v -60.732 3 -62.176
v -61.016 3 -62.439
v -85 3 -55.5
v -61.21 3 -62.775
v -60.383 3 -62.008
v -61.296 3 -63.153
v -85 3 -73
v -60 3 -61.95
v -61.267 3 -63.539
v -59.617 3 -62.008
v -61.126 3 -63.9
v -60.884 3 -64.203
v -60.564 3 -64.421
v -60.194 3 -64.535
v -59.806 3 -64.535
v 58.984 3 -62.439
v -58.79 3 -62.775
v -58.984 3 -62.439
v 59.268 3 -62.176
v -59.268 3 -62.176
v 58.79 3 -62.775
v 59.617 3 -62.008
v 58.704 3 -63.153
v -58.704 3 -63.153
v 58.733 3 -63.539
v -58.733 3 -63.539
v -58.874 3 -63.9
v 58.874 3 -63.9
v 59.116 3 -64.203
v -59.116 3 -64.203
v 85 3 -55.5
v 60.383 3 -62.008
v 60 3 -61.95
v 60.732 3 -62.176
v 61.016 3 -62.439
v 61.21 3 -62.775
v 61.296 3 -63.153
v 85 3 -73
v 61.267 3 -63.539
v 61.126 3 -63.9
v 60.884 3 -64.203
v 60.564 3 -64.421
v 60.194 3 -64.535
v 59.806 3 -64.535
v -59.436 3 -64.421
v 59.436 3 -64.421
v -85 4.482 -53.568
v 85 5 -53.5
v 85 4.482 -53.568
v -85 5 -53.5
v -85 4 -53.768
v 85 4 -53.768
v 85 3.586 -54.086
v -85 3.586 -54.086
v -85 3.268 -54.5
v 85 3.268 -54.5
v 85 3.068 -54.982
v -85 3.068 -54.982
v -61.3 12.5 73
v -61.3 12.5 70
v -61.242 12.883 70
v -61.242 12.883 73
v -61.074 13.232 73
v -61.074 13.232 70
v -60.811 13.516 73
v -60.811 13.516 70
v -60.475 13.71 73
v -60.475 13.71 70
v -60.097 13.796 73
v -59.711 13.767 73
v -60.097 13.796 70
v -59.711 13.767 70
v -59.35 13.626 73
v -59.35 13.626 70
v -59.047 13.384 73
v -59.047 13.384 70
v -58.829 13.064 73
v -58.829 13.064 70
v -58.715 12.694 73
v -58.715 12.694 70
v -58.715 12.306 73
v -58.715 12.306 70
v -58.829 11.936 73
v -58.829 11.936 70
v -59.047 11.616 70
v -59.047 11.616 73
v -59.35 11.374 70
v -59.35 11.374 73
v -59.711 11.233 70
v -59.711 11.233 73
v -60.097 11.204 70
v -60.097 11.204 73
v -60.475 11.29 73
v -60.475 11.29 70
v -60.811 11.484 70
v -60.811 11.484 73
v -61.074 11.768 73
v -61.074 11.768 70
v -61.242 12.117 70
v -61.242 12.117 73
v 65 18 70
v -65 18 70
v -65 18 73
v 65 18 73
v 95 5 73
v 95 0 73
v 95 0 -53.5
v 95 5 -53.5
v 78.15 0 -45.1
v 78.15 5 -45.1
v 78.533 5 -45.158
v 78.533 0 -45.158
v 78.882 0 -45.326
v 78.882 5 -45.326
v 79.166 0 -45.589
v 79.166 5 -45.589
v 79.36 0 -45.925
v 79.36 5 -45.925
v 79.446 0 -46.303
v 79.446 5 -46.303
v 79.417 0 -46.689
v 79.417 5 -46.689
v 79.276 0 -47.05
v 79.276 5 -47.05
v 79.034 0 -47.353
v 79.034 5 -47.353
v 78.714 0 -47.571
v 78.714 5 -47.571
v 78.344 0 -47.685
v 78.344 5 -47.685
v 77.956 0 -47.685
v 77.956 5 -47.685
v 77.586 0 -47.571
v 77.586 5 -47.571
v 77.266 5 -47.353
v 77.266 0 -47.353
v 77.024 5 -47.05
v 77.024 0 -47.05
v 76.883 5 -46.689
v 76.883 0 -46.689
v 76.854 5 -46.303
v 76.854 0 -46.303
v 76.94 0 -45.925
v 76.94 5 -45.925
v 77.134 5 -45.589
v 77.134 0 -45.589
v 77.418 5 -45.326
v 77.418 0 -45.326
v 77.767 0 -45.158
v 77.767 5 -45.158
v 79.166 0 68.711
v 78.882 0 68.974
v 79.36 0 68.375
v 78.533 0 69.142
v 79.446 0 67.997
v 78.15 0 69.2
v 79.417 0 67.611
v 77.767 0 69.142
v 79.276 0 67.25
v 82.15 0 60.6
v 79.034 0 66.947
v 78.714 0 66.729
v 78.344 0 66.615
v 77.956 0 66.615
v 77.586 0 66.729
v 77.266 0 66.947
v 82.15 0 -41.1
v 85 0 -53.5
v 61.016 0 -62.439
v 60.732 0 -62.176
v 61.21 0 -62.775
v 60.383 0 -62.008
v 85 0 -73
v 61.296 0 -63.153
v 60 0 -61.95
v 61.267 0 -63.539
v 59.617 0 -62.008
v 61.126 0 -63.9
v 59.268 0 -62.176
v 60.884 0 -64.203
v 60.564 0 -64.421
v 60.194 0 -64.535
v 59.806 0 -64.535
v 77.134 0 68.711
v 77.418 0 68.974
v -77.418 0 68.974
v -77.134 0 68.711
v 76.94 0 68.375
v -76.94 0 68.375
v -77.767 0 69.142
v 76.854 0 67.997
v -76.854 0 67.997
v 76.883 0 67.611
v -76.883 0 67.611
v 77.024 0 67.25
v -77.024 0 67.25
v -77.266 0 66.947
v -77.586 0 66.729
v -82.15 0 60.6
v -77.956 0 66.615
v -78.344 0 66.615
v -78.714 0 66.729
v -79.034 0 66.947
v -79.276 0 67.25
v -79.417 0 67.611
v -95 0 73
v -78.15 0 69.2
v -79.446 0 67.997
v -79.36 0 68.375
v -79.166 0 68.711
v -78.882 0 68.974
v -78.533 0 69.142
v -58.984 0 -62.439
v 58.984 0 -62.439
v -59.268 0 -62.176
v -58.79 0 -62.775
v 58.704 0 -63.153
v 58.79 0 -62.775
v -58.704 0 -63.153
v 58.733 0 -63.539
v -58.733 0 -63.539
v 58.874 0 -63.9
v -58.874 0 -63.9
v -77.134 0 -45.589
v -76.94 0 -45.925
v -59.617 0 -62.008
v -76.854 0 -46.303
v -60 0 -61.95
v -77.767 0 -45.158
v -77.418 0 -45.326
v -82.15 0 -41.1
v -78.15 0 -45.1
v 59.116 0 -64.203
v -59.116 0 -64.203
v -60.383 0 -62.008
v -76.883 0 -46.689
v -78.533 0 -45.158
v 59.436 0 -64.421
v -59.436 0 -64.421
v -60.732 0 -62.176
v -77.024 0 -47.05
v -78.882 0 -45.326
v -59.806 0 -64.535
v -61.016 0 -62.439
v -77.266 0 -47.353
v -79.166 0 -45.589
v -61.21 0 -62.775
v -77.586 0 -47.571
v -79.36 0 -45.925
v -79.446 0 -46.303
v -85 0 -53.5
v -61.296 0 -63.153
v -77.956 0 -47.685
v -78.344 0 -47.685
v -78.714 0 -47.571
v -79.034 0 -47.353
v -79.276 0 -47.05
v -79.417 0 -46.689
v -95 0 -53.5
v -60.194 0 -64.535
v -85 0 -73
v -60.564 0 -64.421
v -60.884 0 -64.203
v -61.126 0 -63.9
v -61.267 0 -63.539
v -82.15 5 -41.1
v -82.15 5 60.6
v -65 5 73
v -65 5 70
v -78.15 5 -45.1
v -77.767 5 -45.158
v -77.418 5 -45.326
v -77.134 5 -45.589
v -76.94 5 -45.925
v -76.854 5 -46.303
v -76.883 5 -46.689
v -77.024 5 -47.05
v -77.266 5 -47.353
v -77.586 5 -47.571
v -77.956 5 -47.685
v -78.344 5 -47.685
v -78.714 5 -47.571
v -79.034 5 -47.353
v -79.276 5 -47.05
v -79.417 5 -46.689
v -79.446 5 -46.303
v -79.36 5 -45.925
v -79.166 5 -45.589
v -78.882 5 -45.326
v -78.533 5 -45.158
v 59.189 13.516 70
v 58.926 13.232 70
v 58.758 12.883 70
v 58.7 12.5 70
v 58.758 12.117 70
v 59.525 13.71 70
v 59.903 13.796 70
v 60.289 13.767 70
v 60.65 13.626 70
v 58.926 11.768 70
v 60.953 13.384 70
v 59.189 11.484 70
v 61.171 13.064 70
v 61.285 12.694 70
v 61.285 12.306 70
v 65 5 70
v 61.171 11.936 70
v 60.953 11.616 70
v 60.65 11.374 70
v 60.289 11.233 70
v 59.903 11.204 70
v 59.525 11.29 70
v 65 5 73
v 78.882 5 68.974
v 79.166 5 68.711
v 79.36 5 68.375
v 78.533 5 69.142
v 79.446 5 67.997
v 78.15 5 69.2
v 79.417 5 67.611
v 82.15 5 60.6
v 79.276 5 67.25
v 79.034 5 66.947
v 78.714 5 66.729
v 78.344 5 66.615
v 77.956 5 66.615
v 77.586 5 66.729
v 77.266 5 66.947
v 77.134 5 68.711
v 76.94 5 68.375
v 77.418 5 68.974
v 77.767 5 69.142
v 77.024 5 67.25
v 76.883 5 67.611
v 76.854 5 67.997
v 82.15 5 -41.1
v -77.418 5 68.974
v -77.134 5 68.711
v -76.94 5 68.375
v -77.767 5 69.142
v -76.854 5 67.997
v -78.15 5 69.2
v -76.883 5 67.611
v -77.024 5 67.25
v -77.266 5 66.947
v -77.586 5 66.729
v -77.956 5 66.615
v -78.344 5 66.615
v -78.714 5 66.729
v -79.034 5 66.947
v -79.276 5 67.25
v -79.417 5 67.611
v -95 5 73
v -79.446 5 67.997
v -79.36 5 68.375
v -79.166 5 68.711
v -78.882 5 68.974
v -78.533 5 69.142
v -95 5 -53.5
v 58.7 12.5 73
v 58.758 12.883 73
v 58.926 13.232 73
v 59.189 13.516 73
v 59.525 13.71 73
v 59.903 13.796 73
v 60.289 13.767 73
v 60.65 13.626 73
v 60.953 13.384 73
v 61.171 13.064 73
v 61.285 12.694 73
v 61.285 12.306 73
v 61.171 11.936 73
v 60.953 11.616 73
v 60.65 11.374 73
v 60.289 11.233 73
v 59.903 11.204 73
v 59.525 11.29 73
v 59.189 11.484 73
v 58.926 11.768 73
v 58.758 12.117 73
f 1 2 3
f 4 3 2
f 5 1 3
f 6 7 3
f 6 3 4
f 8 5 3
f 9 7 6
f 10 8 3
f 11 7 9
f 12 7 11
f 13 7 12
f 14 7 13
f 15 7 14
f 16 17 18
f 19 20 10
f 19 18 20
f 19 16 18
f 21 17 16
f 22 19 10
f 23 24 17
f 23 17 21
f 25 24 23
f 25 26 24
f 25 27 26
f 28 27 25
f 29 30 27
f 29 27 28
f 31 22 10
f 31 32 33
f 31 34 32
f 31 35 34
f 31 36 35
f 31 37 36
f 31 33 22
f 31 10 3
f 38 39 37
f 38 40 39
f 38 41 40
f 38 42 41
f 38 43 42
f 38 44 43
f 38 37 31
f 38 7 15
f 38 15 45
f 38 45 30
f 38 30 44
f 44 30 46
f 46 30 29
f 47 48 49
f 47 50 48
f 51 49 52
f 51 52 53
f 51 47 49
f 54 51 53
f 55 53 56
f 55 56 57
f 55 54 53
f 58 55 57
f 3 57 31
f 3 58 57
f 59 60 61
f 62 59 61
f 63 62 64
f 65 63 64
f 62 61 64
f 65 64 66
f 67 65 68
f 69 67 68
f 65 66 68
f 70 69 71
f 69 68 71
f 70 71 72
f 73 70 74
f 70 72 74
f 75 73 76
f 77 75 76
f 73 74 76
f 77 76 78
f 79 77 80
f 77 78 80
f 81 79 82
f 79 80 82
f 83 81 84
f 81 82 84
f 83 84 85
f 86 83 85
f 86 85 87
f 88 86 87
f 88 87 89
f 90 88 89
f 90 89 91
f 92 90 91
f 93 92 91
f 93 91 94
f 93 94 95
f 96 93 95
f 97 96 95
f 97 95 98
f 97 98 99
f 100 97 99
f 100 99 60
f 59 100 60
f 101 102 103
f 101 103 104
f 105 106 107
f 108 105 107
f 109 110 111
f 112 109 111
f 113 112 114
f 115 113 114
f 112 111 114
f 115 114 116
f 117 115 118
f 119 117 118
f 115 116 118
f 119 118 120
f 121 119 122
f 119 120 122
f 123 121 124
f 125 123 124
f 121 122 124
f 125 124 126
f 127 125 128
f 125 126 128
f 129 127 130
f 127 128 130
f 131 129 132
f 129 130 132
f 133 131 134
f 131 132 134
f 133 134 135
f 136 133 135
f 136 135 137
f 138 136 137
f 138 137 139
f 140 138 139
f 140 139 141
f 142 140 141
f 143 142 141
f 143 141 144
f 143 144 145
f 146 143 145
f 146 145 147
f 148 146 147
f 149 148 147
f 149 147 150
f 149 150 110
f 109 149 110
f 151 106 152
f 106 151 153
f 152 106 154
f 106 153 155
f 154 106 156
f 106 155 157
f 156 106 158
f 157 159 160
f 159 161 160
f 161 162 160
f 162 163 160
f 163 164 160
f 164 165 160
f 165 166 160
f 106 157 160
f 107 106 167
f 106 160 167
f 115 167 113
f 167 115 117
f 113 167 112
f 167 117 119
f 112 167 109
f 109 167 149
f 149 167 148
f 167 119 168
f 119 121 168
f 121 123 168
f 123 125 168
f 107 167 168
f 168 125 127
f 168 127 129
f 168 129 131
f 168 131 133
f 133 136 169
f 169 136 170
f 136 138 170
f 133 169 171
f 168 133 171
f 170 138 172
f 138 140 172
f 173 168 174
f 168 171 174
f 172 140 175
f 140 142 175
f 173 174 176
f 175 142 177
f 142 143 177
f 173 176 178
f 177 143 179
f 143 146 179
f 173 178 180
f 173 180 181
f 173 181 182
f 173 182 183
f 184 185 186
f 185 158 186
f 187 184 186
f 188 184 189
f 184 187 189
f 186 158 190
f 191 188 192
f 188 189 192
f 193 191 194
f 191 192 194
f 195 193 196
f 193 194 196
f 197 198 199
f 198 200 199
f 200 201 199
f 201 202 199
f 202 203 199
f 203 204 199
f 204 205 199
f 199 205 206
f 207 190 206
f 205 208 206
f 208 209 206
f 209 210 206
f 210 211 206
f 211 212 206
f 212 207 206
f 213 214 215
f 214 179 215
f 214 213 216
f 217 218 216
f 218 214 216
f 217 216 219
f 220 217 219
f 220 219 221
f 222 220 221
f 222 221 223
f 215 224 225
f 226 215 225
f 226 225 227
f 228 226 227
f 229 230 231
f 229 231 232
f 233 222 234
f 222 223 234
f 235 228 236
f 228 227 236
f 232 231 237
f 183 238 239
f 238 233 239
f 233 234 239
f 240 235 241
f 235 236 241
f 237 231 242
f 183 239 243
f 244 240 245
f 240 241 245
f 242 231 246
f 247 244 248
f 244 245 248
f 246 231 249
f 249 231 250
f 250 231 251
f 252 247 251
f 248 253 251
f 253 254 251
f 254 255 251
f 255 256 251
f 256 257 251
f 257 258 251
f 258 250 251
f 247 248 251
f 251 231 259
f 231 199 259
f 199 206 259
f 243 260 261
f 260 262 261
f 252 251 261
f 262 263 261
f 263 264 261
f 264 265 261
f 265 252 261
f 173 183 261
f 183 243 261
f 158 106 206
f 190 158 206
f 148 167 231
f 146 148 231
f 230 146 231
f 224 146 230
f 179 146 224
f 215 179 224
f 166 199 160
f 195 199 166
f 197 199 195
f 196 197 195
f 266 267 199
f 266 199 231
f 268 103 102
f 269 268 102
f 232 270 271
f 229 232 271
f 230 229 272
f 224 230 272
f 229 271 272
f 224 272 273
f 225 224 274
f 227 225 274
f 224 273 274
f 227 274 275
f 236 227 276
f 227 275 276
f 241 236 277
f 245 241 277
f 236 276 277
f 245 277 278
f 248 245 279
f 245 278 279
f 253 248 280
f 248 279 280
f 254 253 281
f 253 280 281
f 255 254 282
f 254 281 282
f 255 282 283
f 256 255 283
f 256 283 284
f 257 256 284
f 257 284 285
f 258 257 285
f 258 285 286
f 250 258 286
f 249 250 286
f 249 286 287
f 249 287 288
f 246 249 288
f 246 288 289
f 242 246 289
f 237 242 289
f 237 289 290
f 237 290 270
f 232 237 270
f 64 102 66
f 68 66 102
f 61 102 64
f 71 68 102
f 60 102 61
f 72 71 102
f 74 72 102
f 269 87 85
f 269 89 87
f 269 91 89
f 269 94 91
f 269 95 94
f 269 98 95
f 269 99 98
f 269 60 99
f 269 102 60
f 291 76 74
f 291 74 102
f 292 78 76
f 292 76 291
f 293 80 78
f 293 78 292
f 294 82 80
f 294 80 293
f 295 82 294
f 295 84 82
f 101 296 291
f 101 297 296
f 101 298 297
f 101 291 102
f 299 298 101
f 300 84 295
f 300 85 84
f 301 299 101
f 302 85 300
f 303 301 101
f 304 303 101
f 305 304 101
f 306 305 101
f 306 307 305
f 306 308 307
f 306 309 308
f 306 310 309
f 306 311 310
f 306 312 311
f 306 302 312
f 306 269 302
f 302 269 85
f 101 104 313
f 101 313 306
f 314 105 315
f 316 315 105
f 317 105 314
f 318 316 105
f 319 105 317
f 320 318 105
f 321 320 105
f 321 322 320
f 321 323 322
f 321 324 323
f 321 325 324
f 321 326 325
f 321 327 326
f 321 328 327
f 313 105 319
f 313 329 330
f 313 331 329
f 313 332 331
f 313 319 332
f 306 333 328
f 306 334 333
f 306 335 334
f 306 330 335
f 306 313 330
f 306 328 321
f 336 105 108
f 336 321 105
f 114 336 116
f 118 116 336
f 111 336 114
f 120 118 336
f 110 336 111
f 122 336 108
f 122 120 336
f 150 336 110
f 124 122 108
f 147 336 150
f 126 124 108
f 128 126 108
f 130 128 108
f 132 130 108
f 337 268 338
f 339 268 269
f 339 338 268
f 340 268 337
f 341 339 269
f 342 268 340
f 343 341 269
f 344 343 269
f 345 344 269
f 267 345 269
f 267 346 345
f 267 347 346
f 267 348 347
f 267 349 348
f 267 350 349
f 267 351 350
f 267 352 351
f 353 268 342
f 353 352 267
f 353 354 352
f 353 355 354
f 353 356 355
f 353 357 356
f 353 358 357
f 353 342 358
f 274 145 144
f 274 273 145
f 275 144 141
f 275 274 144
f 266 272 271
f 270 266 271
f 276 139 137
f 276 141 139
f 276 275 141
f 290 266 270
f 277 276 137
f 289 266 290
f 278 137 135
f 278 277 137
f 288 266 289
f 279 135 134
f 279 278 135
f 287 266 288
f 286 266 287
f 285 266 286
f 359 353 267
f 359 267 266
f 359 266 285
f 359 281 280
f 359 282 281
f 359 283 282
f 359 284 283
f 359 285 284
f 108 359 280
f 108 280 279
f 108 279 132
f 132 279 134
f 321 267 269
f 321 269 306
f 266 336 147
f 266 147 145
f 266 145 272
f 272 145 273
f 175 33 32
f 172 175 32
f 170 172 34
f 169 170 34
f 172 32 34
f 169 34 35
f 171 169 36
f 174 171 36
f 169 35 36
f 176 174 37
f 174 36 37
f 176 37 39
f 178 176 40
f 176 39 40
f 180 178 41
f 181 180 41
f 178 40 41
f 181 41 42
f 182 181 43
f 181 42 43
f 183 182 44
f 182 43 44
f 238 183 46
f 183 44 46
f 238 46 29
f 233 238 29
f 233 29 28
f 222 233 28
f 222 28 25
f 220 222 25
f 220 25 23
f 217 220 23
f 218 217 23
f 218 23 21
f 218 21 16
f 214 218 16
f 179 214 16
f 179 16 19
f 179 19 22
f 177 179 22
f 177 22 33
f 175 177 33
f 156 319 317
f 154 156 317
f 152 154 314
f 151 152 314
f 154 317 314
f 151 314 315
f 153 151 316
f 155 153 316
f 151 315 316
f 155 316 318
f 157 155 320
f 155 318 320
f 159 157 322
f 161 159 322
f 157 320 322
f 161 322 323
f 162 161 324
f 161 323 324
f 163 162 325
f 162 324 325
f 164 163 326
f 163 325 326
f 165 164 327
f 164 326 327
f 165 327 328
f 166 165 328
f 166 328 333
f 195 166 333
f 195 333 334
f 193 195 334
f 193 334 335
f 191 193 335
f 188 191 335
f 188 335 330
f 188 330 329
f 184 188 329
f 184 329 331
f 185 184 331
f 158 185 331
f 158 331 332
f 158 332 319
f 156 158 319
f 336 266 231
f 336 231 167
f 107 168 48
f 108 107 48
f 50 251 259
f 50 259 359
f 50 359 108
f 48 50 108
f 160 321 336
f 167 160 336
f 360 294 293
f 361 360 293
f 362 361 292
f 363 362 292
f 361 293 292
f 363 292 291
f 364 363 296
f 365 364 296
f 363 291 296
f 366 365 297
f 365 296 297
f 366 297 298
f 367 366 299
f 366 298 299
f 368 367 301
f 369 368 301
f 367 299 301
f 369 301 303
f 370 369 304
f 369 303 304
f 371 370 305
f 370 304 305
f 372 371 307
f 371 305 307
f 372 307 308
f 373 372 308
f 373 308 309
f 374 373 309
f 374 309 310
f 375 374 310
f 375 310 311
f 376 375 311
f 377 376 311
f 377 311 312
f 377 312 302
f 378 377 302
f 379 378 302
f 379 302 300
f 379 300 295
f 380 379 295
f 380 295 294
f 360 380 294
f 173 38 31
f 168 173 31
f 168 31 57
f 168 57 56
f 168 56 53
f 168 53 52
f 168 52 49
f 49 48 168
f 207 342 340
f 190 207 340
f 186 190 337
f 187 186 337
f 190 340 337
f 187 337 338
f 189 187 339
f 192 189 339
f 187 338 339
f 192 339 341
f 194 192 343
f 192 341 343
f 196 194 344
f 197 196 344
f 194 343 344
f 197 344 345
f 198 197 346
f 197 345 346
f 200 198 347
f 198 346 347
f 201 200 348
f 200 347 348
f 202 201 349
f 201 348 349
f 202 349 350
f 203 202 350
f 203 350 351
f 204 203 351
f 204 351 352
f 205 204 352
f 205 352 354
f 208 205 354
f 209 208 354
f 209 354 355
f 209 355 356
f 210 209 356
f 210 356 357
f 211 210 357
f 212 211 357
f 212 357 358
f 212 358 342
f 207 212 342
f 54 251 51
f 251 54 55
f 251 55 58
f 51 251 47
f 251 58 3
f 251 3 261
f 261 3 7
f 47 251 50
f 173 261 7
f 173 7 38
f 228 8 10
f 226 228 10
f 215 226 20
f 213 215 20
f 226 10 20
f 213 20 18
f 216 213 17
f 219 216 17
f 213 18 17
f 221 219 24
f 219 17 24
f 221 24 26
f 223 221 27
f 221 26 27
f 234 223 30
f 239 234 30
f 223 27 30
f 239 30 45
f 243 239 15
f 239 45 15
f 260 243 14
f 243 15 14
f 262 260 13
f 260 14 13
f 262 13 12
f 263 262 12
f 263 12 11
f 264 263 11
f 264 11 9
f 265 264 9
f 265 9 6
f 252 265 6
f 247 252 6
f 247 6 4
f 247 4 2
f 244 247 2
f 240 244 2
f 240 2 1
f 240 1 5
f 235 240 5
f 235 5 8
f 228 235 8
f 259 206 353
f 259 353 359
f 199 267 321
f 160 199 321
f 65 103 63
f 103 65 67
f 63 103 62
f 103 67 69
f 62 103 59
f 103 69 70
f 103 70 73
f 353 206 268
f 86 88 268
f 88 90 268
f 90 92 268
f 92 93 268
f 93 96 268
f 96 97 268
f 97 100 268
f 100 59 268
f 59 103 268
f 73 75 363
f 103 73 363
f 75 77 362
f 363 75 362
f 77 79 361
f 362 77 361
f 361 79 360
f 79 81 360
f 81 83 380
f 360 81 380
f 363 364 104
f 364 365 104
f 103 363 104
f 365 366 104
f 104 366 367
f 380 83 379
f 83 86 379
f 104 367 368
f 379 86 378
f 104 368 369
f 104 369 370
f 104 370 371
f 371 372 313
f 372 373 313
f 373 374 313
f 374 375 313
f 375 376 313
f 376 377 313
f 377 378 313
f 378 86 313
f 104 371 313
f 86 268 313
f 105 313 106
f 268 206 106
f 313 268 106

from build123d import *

# Parameters (mm, degrees)
SKETCH1_W           = 170
SKETCH1_H           = 146
BOSS_EXTRUDE1_DEPTH = 3
SKETCH2_R           = 1.3
CUT_EXTRUDE1_DEPTH  = 3
CUT_EXTRUDE2_DEPTH  = 3
BOSS_EXTRUDE2_START = 2
SKETCH4_R           = 1.3
SKETCH4_W           = 164.3
SKETCH4_H           = 101.7
BOSS_EXTRUDE2_DEPTH = 2
BOSS_EXTRUDE5_DEPTH = 10
SKETCH10_W          = 126.5
SKETCH10_H          = 5
BOSS_EXTRUDE6_DEPTH = 10
SKETCH12_W          = 190
SKETCH12_H          = 3
BOSS_EXTRUDE8_DEPTH = 13
SKETCH13_R          = 1.3
CUT_EXTRUDE3_DEPTH  = 13
FILLET4_R           = 2
SKETCH14_R          = 1.3
CUT_EXTRUDE4_DEPTH  = 13
SKETCH15_W          = 30
SKETCH15_H          = 3
CUT_EXTRUDE5_DEPTH  = 13


with BuildPart() as part:
    # Sketch1 → Boss-Extrude1 (new body)
    with BuildSketch(Plane(origin=(0, 0, 0), x_dir=(1, 0, 0), z_dir=(0, 1, 0))):
        Rectangle(SKETCH1_W, SKETCH1_H)
    extrude(amount=BOSS_EXTRUDE1_DEPTH)

    # Sketch2 → Cut-Extrude1 (cut)
    with BuildSketch(Plane(origin=(0, 3, 0), x_dir=(1, 0, 0), z_dir=(0, 1, 0))):
        with Locations(Location((78.15, -67.9, 0), (0, 0, 270))):
            Circle(SKETCH2_R)
        with Locations(Location((-78.15, 46.4, 0), (0, 0, 270))):
            Circle(SKETCH2_R)
        with Locations(Location((-78.15, -67.9, 0), (0, 0, 270))):
            Circle(SKETCH2_R)
        with Locations(Location((78.15, 46.4, 0), (0, 0, 270))):
            Circle(SKETCH2_R)
    extrude(amount=-CUT_EXTRUDE1_DEPTH, mode=Mode.SUBTRACT)

    # Sketch3 → Cut-Extrude2 (cut)
    with BuildSketch(Plane(origin=(0, 3, 0), x_dir=(1, 0, 0), z_dir=(0, 1, 0))):
        Polygon((-78.15, -60.6), (-82.15, -60.6), (-82.15, 41.1), (-78.15, 41.1), (78.15, 41.1), (82.15, 41.1), (82.15, -60.6), (78.15, -60.6), align=None)
    extrude(amount=-CUT_EXTRUDE2_DEPTH, mode=Mode.SUBTRACT)

    # Sketch4 → Boss-Extrude2 (add)
    with BuildSketch(Plane(origin=(0, 3, 0), x_dir=(1, 0, 0), z_dir=(0, 1, 0)).offset(BOSS_EXTRUDE2_START)):
        Polygon((-82.15, 53.5), (85, 53.5), (85, -73), (-85, -73), (-85, 53.5), align=None)
        with Locations(Location((-78.15, 46.4, 0), (0, 0, 270))):
            Circle(SKETCH4_R, mode=Mode.SUBTRACT)
        with Locations(Location((-78.15, -67.9, 0), (0, 0, 270))):
            Circle(SKETCH4_R, mode=Mode.SUBTRACT)
        with Locations(Location((78.15, -67.9, 0), (0, 0, 270))):
            Circle(SKETCH4_R, mode=Mode.SUBTRACT)
        with Locations(Location((78.15, 46.4, 0), (0, 0, 270))):
            Circle(SKETCH4_R, mode=Mode.SUBTRACT)
        with Locations((0, -9.75)):
            Rectangle(SKETCH4_W, SKETCH4_H, mode=Mode.SUBTRACT)
    extrude(amount=-BOSS_EXTRUDE2_DEPTH)

    # Sketch9 → Boss-Extrude5 (add)
    with BuildSketch(Plane.ZY.offset(85)):
        Polygon((-53.5, 3), (-53.5, 5), (73, 5), (73, 0), (-53.5, 0), align=None)
    extrude(amount=BOSS_EXTRUDE5_DEPTH)

    # Sketch10 → Boss-Extrude6 (add)
    with BuildSketch(Plane(origin=(85, 0, 0), x_dir=(0, 0, -1), z_dir=(1, 0, 0))):
        with Locations((-9.75, 2.5)):
            Rectangle(SKETCH10_W, SKETCH10_H)
    extrude(amount=BOSS_EXTRUDE6_DEPTH)

    # Sketch12 → Boss-Extrude8 (add)
    with BuildSketch(Plane(origin=(0, 5, 0), x_dir=(1, 0, 0), z_dir=(0, 1, 0))):
        with Locations((0, -71.5)):
            Rectangle(SKETCH12_W, SKETCH12_H)
    extrude(amount=BOSS_EXTRUDE8_DEPTH)

    # Sketch13 → Cut-Extrude3 (cut)
    with BuildSketch(Plane(origin=(0, 3, 0), x_dir=(1, 0, 0), z_dir=(0, 1, 0))):
        with Locations(Location((-60, 63.25, 0), (0, 0, 270))):
            Circle(SKETCH13_R)
        with Locations(Location((60, 63.25, 0), (0, 0, 270))):
            Circle(SKETCH13_R)
    extrude(amount=-CUT_EXTRUDE3_DEPTH, mode=Mode.SUBTRACT)

    # Fillet4
    fillet4_edges = [part.edges().sort_by_distance(p)[0] for p in [
        (0, 3, -53.5),
    ]]
    fillet(fillet4_edges, radius=FILLET4_R - 0.0001)  # a hair under: the kernel refuses the full size

    # Sketch14 → Cut-Extrude4 (cut)
    with BuildSketch(Plane(origin=(0, 0, 70), x_dir=(-1, 0, 0), z_dir=(0, 0, -1))):
        with Locations((-60, 12.5)):
            Circle(SKETCH14_R)
        with Locations((60, 12.5)):
            Circle(SKETCH14_R)
    extrude(amount=-CUT_EXTRUDE4_DEPTH, mode=Mode.SUBTRACT)

    # Sketch15 → Cut-Extrude5 (cut)
    with BuildSketch(Plane(origin=(0, 18, 0), x_dir=(1, 0, 0), z_dir=(0, 1, 0))):
        with Locations((80, -71.5)):
            Rectangle(SKETCH15_W, SKETCH15_H)
        with Locations((-80, -71.5)):
            Rectangle(SKETCH15_W, SKETCH15_H)
    extrude(amount=-CUT_EXTRUDE5_DEPTH, mode=Mode.SUBTRACT)


solid = part.part
